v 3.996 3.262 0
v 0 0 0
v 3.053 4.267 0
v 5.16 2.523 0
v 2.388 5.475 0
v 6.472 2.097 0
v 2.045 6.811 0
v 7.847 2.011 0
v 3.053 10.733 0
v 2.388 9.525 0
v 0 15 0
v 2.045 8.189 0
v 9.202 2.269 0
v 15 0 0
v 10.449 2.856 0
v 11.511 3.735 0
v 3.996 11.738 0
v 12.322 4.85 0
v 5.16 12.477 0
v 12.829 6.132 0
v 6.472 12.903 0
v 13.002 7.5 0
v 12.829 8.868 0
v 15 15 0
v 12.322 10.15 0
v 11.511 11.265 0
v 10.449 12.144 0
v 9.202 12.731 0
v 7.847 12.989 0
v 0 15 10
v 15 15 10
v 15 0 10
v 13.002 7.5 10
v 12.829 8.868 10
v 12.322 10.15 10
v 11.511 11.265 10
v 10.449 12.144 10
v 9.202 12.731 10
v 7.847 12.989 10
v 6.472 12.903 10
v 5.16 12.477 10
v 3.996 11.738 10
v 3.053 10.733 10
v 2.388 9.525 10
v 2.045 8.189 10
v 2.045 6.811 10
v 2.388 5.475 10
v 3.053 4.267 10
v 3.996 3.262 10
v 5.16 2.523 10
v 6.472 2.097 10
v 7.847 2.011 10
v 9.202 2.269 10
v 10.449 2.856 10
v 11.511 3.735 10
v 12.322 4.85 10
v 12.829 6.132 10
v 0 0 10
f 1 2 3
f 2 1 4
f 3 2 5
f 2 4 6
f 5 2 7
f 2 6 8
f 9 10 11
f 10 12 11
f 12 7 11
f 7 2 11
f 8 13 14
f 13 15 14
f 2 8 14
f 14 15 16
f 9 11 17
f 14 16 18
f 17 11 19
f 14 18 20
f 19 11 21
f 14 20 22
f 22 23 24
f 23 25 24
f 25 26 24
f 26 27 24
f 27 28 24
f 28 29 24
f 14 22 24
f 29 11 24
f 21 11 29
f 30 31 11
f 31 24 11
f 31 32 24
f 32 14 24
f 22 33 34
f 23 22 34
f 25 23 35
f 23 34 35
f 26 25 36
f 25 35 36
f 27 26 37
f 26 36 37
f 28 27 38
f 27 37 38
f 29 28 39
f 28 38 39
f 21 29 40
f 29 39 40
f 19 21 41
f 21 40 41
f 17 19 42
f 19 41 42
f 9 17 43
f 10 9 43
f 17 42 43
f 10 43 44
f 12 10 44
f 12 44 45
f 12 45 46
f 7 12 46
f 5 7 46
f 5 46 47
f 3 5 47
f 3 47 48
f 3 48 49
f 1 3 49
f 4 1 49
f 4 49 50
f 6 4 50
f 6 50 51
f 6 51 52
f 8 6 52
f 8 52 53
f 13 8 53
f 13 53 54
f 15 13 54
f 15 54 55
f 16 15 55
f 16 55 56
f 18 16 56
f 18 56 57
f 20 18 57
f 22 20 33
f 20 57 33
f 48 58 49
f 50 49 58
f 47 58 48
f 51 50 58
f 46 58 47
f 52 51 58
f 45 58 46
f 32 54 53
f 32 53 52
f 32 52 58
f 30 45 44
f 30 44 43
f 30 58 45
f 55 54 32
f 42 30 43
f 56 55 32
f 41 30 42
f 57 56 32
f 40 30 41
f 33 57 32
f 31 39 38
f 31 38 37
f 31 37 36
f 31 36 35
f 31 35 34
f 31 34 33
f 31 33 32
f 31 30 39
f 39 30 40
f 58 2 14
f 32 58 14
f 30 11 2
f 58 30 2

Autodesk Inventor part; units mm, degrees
ref_plane "YZ Plane" through (0, 0, 0) normal (1, 0, 0) x (0, 1, 0)
ref_plane "XZ Plane" through (0, 0, 0) normal (0, 1, 0) x (-1, 0, 0)
ref_plane "XY Plane" through (0, 0, 0) normal (0, 0, 1) x (1, 0, 0)
sketch "Sketch1" plane through (0, 0, 0) normal (0, 0, 1) x (1, 0, 0)
  point P0 (0, 0)
sketch "Sketch2" plane through (0, 0, 0) normal (0, 0, 1) x (1, 0, 0)
  line L0 (0, 0) -> (15, 0)
  line L1 (15, 0) -> (15, 15)
  line L2 (15, 15) -> (0, 15)
  line L3 (0, 15) -> (0, 0)
  line L4 (0, 7.9375) -> (15.875, 7.9375)
  line L5 (7.9375, 15) -> (7.9375, 0)
  dimension "d0" = 15
  dimension "d1" = 15
extrude "Extrusion1" add sketch "Sketch2" along normal blind 10
sketch "Sketch3" plane through (0, 0, 10) normal (0, 0, 1) x (1, 0, 0)
  line L0 (0, 14.9966) -> (7.5, 15)
  line L1 (15, 15) -> (0, 15) projected
  line L2 (0.0034, 7.4661) -> (15, 7.2509)
  arc A0 (7.5017, 0) -> (7.5, 15) centre (-22407.2052, 4.9864) ccw
  circle A1 centre (7.5021, 7.5) radius 5.5
  point P0 (0, 0)
  dimension "d4" = 11
extrude "Extrusion2" cut sketch "Sketch3" along normal through all both and the other way through all
thread "Thread1" size "M11x1.5" class "6H" standard "ANSI Metric M Profile" full length
properties part number "bolt1"
